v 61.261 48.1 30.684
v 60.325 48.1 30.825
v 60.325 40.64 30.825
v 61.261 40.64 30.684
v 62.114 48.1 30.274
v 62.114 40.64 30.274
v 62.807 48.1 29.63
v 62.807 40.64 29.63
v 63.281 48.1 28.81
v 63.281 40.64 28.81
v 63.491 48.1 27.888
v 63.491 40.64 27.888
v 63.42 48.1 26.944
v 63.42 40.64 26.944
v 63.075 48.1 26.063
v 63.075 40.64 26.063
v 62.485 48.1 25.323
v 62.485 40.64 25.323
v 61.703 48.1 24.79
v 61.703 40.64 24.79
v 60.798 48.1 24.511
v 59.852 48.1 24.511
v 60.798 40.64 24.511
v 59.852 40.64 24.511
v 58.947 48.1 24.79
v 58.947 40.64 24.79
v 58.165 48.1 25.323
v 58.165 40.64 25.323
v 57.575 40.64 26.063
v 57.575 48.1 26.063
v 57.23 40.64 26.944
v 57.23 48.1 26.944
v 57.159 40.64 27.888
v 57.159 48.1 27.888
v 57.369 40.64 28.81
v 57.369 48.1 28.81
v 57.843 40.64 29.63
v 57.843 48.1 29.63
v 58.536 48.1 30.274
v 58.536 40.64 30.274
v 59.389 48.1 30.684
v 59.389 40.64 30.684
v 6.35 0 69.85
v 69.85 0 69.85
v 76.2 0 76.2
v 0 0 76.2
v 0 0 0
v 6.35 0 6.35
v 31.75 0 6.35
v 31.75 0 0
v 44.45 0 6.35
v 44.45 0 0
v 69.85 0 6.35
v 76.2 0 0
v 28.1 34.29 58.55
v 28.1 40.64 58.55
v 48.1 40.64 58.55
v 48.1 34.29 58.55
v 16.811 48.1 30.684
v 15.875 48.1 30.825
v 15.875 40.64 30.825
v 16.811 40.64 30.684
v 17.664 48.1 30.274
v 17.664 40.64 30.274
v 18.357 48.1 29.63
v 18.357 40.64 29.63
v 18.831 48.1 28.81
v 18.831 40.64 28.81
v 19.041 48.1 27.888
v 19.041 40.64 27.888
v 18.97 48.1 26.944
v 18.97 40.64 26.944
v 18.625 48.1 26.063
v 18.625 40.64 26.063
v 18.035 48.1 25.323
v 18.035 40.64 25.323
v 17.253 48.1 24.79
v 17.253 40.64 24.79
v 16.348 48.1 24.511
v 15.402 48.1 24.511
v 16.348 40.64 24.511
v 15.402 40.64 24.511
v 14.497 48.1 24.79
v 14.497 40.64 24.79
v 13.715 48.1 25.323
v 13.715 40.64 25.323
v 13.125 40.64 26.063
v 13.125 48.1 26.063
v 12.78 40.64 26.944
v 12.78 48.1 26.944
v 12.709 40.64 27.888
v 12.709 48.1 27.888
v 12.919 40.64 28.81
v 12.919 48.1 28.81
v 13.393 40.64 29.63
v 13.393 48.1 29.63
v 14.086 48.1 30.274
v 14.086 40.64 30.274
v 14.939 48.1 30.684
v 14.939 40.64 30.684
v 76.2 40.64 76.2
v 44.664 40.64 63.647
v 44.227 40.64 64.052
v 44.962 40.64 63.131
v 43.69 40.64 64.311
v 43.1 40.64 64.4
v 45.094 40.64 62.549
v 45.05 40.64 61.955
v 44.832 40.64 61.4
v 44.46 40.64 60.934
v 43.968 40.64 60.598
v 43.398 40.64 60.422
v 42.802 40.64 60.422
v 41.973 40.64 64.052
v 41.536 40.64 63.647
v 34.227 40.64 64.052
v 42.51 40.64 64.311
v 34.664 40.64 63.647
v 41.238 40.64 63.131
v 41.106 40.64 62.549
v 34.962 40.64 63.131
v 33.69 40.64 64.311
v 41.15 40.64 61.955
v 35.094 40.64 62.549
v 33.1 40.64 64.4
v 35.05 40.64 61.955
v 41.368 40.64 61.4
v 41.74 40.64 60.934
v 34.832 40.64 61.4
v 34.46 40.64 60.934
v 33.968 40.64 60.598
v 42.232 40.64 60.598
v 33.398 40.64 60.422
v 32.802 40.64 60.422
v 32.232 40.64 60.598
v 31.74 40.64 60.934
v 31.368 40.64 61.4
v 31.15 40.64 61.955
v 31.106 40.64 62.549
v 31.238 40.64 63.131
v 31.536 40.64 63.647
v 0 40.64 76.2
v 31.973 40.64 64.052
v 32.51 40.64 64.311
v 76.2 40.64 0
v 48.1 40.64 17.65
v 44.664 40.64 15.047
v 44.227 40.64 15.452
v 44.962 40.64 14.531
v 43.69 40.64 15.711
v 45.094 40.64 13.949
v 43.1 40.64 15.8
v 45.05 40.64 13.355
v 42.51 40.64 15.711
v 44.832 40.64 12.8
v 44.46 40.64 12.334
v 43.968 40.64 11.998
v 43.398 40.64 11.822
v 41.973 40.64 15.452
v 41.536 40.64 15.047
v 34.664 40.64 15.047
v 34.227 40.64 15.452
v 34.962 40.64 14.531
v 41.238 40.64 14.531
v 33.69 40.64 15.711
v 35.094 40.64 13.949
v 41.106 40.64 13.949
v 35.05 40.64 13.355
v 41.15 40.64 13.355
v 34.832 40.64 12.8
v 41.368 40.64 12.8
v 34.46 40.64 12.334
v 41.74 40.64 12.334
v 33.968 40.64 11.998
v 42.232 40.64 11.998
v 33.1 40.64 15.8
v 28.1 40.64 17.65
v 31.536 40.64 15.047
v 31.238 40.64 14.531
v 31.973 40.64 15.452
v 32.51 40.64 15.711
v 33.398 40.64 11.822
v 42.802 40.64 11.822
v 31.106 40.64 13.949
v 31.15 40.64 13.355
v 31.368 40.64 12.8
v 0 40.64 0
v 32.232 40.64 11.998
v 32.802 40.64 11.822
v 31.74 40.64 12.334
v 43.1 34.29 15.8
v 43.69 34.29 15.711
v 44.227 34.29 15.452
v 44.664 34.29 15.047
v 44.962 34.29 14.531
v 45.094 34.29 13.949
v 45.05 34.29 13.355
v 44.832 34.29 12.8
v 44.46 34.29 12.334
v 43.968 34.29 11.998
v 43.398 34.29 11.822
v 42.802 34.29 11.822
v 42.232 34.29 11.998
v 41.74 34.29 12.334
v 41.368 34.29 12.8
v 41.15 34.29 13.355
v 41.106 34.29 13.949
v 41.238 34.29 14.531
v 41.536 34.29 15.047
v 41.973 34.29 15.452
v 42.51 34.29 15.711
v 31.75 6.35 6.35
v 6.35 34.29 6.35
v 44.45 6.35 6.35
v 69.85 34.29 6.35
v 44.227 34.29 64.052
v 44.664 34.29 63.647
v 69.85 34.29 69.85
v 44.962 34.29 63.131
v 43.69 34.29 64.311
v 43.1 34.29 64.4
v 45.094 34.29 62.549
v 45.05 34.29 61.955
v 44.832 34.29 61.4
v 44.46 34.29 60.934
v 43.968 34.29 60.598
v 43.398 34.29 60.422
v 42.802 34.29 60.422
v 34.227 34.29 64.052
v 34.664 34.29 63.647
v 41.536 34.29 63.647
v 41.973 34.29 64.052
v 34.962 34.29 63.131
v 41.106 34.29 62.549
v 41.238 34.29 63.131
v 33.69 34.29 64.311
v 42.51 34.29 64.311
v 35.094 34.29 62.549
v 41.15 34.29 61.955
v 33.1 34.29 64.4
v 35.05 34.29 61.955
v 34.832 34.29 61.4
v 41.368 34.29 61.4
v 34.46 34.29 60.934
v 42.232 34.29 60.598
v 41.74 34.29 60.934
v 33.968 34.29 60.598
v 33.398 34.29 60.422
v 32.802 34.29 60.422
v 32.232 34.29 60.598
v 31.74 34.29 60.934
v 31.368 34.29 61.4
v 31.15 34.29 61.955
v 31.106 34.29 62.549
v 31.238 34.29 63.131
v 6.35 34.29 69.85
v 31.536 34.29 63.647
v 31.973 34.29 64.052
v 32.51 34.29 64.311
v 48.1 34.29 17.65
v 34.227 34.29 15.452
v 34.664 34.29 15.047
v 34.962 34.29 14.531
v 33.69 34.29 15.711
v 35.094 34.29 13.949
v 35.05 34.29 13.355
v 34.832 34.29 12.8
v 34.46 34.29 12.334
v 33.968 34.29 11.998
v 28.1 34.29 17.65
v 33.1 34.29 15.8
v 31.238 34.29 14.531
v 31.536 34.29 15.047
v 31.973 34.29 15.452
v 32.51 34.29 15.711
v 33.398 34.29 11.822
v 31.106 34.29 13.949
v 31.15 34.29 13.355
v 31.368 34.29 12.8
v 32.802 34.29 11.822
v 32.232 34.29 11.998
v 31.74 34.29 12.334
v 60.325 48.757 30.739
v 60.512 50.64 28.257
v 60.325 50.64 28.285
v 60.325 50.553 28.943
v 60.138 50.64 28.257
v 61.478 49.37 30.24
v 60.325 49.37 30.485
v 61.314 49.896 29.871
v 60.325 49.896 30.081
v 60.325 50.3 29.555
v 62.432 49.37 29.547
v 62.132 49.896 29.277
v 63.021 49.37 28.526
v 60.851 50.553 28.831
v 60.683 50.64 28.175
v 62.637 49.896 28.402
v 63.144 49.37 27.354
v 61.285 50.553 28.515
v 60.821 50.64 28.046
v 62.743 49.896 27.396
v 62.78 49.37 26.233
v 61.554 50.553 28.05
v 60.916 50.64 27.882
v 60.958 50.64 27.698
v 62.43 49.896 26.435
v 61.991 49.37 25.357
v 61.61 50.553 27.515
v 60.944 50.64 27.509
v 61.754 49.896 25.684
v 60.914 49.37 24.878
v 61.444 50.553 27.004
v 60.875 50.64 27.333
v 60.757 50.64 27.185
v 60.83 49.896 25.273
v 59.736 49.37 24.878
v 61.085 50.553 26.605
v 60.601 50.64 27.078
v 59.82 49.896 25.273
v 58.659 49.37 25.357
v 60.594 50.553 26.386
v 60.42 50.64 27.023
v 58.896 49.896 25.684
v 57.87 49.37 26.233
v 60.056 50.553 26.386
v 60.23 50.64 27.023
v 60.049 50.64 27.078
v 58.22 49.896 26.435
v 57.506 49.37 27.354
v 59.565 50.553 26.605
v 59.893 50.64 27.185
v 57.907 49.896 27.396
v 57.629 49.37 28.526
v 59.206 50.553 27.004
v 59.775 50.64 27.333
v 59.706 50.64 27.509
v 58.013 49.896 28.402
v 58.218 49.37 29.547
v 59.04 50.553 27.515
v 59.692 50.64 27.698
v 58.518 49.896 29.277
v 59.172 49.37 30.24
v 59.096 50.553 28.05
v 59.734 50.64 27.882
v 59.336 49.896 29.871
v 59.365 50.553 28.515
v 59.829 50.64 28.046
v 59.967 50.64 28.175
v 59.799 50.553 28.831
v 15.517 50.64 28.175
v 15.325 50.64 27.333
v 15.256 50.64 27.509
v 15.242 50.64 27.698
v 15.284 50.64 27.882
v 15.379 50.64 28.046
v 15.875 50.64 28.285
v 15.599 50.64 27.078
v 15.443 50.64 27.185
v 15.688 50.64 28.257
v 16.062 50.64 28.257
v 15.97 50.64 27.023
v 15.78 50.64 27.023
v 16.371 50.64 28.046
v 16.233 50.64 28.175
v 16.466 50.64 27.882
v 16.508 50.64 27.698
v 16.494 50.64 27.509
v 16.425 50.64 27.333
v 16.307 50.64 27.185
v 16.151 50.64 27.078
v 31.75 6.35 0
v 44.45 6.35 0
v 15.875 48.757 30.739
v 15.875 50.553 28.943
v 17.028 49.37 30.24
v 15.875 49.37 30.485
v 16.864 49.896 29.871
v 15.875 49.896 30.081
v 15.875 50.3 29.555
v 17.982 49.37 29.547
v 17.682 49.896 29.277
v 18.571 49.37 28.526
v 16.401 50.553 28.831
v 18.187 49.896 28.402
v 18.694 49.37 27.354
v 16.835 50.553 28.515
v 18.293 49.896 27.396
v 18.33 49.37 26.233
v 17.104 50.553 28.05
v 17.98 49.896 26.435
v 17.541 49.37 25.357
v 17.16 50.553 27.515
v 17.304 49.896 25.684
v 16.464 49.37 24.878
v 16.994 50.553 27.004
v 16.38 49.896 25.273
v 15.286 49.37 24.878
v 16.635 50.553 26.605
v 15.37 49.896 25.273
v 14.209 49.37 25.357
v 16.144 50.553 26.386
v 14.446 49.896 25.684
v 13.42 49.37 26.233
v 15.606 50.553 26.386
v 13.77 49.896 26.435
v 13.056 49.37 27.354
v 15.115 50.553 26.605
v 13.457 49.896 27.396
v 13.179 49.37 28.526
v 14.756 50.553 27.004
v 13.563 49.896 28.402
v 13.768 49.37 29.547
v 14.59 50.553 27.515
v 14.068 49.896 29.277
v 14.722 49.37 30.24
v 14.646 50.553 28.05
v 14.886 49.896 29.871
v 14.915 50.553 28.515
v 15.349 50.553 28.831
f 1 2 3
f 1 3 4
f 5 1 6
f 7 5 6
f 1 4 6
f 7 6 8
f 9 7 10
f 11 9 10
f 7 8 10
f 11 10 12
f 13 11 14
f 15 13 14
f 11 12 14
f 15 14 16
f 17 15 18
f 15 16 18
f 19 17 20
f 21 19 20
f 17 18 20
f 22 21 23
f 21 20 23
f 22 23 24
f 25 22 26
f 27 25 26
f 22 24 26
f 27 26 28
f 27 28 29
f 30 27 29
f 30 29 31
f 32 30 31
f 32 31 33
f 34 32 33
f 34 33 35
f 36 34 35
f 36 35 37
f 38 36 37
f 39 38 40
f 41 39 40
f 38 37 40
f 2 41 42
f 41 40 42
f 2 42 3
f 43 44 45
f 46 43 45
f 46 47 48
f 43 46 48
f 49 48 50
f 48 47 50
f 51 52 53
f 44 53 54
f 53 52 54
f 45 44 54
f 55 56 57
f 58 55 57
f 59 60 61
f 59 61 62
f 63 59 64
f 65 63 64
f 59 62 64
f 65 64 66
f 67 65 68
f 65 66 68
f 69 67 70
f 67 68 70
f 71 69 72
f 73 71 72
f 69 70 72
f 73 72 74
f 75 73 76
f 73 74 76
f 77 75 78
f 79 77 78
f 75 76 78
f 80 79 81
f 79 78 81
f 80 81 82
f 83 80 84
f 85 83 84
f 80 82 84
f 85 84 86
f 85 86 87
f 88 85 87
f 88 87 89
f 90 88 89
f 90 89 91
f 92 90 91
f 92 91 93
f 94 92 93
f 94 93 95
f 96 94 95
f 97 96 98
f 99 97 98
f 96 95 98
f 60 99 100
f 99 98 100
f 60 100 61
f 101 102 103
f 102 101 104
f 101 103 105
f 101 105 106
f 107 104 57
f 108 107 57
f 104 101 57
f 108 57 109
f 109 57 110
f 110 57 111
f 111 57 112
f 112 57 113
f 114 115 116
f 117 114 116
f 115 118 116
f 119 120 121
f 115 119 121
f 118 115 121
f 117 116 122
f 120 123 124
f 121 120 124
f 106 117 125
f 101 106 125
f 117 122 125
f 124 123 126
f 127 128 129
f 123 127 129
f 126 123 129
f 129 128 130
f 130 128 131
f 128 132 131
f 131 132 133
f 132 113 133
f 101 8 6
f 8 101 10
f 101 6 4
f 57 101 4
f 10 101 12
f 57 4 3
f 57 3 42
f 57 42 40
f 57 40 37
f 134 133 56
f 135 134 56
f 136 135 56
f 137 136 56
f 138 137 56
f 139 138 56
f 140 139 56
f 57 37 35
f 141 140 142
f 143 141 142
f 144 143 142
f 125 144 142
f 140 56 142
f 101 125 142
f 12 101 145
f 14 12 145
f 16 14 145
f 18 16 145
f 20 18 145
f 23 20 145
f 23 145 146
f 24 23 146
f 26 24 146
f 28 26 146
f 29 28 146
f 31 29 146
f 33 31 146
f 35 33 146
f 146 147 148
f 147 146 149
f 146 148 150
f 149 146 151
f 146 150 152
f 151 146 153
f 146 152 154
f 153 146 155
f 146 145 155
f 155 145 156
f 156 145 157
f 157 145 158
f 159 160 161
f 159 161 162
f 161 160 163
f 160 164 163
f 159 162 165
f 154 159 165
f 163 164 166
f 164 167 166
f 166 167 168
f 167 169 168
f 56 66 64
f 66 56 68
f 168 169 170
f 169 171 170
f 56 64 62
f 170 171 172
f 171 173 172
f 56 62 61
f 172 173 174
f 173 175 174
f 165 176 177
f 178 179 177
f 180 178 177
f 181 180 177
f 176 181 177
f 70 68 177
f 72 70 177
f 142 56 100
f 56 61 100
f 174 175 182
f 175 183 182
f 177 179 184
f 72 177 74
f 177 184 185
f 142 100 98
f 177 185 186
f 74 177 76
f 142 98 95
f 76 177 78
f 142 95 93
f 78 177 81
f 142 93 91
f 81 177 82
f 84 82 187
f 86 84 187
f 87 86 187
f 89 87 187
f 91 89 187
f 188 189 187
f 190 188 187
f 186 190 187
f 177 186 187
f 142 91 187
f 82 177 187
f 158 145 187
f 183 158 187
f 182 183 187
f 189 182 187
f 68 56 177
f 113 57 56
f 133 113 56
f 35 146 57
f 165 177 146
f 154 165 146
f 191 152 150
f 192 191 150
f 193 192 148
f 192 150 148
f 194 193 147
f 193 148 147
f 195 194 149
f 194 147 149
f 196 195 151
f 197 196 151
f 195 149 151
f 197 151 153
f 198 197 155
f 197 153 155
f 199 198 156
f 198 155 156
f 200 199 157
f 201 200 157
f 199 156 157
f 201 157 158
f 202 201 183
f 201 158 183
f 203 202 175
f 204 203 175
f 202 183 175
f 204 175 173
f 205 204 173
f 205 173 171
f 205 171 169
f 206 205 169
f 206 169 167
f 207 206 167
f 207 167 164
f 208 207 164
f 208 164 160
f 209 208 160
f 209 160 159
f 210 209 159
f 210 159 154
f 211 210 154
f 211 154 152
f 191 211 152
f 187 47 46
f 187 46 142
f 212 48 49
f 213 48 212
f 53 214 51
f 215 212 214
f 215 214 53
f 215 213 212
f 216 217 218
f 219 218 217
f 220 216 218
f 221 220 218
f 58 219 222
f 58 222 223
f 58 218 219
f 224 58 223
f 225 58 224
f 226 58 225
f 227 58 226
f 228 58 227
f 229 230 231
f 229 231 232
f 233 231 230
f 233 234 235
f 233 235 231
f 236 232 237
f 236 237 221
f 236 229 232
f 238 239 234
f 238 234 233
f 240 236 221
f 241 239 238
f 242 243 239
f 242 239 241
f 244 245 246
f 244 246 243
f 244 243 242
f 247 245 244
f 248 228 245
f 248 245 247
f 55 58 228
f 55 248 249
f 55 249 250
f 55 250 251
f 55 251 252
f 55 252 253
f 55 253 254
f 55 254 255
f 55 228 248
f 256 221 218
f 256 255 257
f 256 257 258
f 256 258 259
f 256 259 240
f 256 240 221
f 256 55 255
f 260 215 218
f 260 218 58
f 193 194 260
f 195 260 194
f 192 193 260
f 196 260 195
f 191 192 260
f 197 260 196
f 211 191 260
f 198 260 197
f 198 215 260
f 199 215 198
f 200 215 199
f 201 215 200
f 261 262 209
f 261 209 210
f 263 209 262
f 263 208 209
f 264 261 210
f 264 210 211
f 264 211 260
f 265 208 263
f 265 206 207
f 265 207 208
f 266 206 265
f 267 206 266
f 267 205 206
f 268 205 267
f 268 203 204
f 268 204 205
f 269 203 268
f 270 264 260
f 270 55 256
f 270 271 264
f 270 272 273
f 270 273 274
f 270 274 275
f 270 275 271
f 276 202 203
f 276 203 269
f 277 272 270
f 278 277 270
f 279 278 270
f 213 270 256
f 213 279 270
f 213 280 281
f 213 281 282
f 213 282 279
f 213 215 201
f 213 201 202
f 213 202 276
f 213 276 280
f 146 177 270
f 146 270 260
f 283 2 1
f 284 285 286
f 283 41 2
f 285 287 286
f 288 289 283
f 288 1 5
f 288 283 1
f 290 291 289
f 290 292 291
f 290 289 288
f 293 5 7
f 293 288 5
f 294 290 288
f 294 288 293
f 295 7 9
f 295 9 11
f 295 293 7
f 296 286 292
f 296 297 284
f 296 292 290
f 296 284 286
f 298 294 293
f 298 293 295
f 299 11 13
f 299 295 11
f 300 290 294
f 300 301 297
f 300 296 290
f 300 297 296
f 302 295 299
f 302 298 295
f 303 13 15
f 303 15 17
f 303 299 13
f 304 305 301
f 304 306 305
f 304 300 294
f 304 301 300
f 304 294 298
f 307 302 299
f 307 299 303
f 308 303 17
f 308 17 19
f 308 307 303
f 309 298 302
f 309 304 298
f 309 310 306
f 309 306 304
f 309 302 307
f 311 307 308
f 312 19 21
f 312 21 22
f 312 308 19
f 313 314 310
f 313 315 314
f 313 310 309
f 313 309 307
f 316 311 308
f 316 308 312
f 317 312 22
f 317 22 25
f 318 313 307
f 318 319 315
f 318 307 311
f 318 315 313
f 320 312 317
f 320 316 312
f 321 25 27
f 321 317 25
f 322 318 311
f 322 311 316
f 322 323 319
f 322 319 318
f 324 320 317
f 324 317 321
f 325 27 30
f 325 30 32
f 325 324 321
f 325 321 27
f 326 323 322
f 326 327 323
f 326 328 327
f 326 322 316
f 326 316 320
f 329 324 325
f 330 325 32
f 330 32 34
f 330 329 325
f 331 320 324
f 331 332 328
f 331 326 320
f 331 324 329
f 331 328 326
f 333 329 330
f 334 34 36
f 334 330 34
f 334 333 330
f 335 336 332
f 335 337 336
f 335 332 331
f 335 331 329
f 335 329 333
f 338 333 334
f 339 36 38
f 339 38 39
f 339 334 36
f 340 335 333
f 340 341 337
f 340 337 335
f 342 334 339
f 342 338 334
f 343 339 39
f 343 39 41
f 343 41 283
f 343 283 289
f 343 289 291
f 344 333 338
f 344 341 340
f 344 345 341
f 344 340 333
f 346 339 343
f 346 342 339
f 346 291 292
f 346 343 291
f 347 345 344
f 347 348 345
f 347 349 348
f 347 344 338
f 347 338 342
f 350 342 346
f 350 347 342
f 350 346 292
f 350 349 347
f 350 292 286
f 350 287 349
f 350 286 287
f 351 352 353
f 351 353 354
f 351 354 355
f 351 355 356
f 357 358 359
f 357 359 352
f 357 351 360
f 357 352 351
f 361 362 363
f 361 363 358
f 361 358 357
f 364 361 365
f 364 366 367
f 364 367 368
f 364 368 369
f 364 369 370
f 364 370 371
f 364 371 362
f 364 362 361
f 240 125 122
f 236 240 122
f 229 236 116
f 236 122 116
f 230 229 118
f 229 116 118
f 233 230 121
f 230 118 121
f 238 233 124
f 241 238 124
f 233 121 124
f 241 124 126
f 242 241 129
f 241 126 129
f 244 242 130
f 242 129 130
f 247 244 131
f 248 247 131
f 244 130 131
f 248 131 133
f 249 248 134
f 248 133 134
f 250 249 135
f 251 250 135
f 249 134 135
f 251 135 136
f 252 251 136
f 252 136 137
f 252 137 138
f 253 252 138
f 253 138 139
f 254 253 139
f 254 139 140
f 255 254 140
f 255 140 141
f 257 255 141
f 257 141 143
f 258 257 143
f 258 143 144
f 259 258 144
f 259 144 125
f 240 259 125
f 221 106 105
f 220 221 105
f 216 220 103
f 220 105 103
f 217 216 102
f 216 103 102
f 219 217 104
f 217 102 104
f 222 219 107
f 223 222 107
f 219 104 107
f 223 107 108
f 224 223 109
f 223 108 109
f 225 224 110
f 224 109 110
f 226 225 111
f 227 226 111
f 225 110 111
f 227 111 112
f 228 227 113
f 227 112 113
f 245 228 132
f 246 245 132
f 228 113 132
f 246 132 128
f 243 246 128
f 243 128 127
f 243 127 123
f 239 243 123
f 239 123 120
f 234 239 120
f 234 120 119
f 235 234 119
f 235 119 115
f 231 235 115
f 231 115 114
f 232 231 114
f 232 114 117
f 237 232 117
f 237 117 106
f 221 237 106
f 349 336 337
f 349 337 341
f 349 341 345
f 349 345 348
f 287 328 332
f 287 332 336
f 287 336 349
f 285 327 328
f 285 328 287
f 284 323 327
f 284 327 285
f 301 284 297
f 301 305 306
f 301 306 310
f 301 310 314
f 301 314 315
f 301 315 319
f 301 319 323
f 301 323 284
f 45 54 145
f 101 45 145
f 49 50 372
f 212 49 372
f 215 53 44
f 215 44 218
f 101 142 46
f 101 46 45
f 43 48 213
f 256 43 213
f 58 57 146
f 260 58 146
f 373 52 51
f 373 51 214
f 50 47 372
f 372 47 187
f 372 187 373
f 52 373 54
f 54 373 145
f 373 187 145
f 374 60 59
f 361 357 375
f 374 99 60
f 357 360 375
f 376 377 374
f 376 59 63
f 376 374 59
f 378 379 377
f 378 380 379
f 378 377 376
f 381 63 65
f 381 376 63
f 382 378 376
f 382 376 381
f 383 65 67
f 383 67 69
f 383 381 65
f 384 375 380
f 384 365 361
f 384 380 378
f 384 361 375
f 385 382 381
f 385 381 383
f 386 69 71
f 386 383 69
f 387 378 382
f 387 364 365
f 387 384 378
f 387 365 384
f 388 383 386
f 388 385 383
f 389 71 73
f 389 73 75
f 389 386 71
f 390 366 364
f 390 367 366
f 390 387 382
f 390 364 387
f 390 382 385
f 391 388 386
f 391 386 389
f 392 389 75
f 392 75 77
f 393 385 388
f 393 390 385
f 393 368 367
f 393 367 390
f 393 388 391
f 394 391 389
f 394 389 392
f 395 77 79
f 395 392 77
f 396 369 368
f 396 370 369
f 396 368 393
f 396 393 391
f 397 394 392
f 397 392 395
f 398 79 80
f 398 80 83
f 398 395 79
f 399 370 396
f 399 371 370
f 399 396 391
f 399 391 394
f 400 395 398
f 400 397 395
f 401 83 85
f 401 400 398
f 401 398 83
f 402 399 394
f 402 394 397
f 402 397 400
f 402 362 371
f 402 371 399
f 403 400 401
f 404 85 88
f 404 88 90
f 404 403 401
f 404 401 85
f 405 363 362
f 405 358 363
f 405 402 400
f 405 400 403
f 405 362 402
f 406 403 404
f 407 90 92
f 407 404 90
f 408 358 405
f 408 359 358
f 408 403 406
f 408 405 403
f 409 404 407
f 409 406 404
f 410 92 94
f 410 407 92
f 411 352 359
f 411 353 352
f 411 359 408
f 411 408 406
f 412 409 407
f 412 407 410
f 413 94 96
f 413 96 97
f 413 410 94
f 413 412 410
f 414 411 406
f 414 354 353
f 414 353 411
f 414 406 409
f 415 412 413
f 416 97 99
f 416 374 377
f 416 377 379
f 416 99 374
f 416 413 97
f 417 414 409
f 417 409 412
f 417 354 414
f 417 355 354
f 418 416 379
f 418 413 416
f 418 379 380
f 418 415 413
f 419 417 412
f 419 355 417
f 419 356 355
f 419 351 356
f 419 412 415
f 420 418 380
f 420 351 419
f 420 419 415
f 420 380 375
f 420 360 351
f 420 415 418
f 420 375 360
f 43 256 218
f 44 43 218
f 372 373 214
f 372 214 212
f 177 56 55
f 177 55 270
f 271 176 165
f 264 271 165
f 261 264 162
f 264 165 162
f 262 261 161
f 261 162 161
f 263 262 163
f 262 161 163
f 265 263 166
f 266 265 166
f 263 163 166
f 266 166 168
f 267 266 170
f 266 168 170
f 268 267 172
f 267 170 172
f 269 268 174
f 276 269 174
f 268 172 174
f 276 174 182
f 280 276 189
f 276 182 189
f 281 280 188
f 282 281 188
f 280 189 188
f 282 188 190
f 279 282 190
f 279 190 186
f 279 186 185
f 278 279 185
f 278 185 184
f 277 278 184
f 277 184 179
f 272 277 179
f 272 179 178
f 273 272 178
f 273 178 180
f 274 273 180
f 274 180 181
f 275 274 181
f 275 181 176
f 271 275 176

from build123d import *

# Parameters (mm, degrees)
SKETCH1_W           = 53.6
SKETCH1_H           = 40.64
SKETCH1_W_2         = 11.3
BOSS_EXTRUDE1_DEPTH = 76.2
SHELL1_T            = -6.35
SKETCH2_W           = 20
SKETCH2_H           = 40.9
SKETCH2_R           = 2
CUT_EXTRUDE1_DEPTH  = 116.171565935
SKETCH3_R           = 3.175
BOSS_EXTRUDE2_DEPTH = 10
FILLET2_R           = 2.54
CUT_EXTRUDE2_REACH  = 121.068
SKETCH5_W           = 12.7
SKETCH5_H           = 6.35


with BuildPart() as part:
    # Sketch1 → Boss-Extrude1 (new body)
    with BuildSketch(Plane.XY):
        with Locations((38.1, 20.32)):
            Rectangle(SKETCH1_W, SKETCH1_H)
        with Locations((5.65, 20.32)):
            Rectangle(SKETCH1_W_2, SKETCH1_H)
        with Locations((70.55, 20.32)):
            Rectangle(SKETCH1_W_2, SKETCH1_H)
    extrude(amount=BOSS_EXTRUDE1_DEPTH)

    # Shell1
    shell1_openings = [part.faces().sort_by_distance(p)[0] for p in [
        (38.1, 0, 38.1),
    ]]
    offset(amount=SHELL1_T, openings=shell1_openings, kind=Kind.INTERSECTION)

    # Sketch2 → Cut-Extrude1 (cut, through all)
    with BuildSketch(Plane(origin=(0, 40.64, 0), x_dir=(1, 0, 0), z_dir=(0, 1, 0))):
        with Locations((38.1, -38.1)):
            Rectangle(SKETCH2_W, SKETCH2_H)
        with Locations(Location((43.1, -62.4, 0), (0, 0, 270))):
            Circle(SKETCH2_R)
        with Locations(Location((33.1, -62.4, 0), (0, 0, 270))):
            Circle(SKETCH2_R)
        with Locations(Location((33.1, -13.8, 0), (0, 0, 270))):
            Circle(SKETCH2_R)
        with Locations(Location((43.1, -13.8, 0), (0, 0, 270))):
            Circle(SKETCH2_R)
    extrude(amount=-CUT_EXTRUDE1_DEPTH, mode=Mode.SUBTRACT)

    # Sketch3 → Boss-Extrude2 (add)
    with BuildSketch(Plane(origin=(0, 40.64, 0), x_dir=(1, 0, 0), z_dir=(0, 1, 0))):
        with Locations(Location((15.875, -27.65044, 0), (0, 0, 270))):
            Circle(SKETCH3_R)
        with Locations(Location((60.325, -27.65044, 0), (0, 0, 270))):
            Circle(SKETCH3_R)
    extrude(amount=BOSS_EXTRUDE2_DEPTH)

    # Fillet2
    fillet2_edges = [part.edges().sort_by_distance(p)[0] for p in [
        (15.875, 50.64, 24.47544),
        (60.325, 50.64, 24.47544),
    ]]
    fillet(fillet2_edges, radius=FILLET2_R)

    # Sketch5 → Cut-Extrude2 (cut, up to next)
    with BuildSketch(Plane(origin=(0, 0, 0), x_dir=(-1, 0, 0), z_dir=(0, 0, -1)), mode=Mode.PRIVATE) as cut_extrude2_sk1:
        with Locations((-38.1, 3.175)):
            Rectangle(SKETCH5_W, SKETCH5_H)
    cut_extrude2_tool1 = extrude(cut_extrude2_sk1.sketch, amount=-CUT_EXTRUDE2_REACH, mode=Mode.PRIVATE) & part.part
    add(cut_extrude2_tool1.solids().sort_by_distance((38.1, 3.175, 0))[0], mode=Mode.SUBTRACT)


solid = part.part
